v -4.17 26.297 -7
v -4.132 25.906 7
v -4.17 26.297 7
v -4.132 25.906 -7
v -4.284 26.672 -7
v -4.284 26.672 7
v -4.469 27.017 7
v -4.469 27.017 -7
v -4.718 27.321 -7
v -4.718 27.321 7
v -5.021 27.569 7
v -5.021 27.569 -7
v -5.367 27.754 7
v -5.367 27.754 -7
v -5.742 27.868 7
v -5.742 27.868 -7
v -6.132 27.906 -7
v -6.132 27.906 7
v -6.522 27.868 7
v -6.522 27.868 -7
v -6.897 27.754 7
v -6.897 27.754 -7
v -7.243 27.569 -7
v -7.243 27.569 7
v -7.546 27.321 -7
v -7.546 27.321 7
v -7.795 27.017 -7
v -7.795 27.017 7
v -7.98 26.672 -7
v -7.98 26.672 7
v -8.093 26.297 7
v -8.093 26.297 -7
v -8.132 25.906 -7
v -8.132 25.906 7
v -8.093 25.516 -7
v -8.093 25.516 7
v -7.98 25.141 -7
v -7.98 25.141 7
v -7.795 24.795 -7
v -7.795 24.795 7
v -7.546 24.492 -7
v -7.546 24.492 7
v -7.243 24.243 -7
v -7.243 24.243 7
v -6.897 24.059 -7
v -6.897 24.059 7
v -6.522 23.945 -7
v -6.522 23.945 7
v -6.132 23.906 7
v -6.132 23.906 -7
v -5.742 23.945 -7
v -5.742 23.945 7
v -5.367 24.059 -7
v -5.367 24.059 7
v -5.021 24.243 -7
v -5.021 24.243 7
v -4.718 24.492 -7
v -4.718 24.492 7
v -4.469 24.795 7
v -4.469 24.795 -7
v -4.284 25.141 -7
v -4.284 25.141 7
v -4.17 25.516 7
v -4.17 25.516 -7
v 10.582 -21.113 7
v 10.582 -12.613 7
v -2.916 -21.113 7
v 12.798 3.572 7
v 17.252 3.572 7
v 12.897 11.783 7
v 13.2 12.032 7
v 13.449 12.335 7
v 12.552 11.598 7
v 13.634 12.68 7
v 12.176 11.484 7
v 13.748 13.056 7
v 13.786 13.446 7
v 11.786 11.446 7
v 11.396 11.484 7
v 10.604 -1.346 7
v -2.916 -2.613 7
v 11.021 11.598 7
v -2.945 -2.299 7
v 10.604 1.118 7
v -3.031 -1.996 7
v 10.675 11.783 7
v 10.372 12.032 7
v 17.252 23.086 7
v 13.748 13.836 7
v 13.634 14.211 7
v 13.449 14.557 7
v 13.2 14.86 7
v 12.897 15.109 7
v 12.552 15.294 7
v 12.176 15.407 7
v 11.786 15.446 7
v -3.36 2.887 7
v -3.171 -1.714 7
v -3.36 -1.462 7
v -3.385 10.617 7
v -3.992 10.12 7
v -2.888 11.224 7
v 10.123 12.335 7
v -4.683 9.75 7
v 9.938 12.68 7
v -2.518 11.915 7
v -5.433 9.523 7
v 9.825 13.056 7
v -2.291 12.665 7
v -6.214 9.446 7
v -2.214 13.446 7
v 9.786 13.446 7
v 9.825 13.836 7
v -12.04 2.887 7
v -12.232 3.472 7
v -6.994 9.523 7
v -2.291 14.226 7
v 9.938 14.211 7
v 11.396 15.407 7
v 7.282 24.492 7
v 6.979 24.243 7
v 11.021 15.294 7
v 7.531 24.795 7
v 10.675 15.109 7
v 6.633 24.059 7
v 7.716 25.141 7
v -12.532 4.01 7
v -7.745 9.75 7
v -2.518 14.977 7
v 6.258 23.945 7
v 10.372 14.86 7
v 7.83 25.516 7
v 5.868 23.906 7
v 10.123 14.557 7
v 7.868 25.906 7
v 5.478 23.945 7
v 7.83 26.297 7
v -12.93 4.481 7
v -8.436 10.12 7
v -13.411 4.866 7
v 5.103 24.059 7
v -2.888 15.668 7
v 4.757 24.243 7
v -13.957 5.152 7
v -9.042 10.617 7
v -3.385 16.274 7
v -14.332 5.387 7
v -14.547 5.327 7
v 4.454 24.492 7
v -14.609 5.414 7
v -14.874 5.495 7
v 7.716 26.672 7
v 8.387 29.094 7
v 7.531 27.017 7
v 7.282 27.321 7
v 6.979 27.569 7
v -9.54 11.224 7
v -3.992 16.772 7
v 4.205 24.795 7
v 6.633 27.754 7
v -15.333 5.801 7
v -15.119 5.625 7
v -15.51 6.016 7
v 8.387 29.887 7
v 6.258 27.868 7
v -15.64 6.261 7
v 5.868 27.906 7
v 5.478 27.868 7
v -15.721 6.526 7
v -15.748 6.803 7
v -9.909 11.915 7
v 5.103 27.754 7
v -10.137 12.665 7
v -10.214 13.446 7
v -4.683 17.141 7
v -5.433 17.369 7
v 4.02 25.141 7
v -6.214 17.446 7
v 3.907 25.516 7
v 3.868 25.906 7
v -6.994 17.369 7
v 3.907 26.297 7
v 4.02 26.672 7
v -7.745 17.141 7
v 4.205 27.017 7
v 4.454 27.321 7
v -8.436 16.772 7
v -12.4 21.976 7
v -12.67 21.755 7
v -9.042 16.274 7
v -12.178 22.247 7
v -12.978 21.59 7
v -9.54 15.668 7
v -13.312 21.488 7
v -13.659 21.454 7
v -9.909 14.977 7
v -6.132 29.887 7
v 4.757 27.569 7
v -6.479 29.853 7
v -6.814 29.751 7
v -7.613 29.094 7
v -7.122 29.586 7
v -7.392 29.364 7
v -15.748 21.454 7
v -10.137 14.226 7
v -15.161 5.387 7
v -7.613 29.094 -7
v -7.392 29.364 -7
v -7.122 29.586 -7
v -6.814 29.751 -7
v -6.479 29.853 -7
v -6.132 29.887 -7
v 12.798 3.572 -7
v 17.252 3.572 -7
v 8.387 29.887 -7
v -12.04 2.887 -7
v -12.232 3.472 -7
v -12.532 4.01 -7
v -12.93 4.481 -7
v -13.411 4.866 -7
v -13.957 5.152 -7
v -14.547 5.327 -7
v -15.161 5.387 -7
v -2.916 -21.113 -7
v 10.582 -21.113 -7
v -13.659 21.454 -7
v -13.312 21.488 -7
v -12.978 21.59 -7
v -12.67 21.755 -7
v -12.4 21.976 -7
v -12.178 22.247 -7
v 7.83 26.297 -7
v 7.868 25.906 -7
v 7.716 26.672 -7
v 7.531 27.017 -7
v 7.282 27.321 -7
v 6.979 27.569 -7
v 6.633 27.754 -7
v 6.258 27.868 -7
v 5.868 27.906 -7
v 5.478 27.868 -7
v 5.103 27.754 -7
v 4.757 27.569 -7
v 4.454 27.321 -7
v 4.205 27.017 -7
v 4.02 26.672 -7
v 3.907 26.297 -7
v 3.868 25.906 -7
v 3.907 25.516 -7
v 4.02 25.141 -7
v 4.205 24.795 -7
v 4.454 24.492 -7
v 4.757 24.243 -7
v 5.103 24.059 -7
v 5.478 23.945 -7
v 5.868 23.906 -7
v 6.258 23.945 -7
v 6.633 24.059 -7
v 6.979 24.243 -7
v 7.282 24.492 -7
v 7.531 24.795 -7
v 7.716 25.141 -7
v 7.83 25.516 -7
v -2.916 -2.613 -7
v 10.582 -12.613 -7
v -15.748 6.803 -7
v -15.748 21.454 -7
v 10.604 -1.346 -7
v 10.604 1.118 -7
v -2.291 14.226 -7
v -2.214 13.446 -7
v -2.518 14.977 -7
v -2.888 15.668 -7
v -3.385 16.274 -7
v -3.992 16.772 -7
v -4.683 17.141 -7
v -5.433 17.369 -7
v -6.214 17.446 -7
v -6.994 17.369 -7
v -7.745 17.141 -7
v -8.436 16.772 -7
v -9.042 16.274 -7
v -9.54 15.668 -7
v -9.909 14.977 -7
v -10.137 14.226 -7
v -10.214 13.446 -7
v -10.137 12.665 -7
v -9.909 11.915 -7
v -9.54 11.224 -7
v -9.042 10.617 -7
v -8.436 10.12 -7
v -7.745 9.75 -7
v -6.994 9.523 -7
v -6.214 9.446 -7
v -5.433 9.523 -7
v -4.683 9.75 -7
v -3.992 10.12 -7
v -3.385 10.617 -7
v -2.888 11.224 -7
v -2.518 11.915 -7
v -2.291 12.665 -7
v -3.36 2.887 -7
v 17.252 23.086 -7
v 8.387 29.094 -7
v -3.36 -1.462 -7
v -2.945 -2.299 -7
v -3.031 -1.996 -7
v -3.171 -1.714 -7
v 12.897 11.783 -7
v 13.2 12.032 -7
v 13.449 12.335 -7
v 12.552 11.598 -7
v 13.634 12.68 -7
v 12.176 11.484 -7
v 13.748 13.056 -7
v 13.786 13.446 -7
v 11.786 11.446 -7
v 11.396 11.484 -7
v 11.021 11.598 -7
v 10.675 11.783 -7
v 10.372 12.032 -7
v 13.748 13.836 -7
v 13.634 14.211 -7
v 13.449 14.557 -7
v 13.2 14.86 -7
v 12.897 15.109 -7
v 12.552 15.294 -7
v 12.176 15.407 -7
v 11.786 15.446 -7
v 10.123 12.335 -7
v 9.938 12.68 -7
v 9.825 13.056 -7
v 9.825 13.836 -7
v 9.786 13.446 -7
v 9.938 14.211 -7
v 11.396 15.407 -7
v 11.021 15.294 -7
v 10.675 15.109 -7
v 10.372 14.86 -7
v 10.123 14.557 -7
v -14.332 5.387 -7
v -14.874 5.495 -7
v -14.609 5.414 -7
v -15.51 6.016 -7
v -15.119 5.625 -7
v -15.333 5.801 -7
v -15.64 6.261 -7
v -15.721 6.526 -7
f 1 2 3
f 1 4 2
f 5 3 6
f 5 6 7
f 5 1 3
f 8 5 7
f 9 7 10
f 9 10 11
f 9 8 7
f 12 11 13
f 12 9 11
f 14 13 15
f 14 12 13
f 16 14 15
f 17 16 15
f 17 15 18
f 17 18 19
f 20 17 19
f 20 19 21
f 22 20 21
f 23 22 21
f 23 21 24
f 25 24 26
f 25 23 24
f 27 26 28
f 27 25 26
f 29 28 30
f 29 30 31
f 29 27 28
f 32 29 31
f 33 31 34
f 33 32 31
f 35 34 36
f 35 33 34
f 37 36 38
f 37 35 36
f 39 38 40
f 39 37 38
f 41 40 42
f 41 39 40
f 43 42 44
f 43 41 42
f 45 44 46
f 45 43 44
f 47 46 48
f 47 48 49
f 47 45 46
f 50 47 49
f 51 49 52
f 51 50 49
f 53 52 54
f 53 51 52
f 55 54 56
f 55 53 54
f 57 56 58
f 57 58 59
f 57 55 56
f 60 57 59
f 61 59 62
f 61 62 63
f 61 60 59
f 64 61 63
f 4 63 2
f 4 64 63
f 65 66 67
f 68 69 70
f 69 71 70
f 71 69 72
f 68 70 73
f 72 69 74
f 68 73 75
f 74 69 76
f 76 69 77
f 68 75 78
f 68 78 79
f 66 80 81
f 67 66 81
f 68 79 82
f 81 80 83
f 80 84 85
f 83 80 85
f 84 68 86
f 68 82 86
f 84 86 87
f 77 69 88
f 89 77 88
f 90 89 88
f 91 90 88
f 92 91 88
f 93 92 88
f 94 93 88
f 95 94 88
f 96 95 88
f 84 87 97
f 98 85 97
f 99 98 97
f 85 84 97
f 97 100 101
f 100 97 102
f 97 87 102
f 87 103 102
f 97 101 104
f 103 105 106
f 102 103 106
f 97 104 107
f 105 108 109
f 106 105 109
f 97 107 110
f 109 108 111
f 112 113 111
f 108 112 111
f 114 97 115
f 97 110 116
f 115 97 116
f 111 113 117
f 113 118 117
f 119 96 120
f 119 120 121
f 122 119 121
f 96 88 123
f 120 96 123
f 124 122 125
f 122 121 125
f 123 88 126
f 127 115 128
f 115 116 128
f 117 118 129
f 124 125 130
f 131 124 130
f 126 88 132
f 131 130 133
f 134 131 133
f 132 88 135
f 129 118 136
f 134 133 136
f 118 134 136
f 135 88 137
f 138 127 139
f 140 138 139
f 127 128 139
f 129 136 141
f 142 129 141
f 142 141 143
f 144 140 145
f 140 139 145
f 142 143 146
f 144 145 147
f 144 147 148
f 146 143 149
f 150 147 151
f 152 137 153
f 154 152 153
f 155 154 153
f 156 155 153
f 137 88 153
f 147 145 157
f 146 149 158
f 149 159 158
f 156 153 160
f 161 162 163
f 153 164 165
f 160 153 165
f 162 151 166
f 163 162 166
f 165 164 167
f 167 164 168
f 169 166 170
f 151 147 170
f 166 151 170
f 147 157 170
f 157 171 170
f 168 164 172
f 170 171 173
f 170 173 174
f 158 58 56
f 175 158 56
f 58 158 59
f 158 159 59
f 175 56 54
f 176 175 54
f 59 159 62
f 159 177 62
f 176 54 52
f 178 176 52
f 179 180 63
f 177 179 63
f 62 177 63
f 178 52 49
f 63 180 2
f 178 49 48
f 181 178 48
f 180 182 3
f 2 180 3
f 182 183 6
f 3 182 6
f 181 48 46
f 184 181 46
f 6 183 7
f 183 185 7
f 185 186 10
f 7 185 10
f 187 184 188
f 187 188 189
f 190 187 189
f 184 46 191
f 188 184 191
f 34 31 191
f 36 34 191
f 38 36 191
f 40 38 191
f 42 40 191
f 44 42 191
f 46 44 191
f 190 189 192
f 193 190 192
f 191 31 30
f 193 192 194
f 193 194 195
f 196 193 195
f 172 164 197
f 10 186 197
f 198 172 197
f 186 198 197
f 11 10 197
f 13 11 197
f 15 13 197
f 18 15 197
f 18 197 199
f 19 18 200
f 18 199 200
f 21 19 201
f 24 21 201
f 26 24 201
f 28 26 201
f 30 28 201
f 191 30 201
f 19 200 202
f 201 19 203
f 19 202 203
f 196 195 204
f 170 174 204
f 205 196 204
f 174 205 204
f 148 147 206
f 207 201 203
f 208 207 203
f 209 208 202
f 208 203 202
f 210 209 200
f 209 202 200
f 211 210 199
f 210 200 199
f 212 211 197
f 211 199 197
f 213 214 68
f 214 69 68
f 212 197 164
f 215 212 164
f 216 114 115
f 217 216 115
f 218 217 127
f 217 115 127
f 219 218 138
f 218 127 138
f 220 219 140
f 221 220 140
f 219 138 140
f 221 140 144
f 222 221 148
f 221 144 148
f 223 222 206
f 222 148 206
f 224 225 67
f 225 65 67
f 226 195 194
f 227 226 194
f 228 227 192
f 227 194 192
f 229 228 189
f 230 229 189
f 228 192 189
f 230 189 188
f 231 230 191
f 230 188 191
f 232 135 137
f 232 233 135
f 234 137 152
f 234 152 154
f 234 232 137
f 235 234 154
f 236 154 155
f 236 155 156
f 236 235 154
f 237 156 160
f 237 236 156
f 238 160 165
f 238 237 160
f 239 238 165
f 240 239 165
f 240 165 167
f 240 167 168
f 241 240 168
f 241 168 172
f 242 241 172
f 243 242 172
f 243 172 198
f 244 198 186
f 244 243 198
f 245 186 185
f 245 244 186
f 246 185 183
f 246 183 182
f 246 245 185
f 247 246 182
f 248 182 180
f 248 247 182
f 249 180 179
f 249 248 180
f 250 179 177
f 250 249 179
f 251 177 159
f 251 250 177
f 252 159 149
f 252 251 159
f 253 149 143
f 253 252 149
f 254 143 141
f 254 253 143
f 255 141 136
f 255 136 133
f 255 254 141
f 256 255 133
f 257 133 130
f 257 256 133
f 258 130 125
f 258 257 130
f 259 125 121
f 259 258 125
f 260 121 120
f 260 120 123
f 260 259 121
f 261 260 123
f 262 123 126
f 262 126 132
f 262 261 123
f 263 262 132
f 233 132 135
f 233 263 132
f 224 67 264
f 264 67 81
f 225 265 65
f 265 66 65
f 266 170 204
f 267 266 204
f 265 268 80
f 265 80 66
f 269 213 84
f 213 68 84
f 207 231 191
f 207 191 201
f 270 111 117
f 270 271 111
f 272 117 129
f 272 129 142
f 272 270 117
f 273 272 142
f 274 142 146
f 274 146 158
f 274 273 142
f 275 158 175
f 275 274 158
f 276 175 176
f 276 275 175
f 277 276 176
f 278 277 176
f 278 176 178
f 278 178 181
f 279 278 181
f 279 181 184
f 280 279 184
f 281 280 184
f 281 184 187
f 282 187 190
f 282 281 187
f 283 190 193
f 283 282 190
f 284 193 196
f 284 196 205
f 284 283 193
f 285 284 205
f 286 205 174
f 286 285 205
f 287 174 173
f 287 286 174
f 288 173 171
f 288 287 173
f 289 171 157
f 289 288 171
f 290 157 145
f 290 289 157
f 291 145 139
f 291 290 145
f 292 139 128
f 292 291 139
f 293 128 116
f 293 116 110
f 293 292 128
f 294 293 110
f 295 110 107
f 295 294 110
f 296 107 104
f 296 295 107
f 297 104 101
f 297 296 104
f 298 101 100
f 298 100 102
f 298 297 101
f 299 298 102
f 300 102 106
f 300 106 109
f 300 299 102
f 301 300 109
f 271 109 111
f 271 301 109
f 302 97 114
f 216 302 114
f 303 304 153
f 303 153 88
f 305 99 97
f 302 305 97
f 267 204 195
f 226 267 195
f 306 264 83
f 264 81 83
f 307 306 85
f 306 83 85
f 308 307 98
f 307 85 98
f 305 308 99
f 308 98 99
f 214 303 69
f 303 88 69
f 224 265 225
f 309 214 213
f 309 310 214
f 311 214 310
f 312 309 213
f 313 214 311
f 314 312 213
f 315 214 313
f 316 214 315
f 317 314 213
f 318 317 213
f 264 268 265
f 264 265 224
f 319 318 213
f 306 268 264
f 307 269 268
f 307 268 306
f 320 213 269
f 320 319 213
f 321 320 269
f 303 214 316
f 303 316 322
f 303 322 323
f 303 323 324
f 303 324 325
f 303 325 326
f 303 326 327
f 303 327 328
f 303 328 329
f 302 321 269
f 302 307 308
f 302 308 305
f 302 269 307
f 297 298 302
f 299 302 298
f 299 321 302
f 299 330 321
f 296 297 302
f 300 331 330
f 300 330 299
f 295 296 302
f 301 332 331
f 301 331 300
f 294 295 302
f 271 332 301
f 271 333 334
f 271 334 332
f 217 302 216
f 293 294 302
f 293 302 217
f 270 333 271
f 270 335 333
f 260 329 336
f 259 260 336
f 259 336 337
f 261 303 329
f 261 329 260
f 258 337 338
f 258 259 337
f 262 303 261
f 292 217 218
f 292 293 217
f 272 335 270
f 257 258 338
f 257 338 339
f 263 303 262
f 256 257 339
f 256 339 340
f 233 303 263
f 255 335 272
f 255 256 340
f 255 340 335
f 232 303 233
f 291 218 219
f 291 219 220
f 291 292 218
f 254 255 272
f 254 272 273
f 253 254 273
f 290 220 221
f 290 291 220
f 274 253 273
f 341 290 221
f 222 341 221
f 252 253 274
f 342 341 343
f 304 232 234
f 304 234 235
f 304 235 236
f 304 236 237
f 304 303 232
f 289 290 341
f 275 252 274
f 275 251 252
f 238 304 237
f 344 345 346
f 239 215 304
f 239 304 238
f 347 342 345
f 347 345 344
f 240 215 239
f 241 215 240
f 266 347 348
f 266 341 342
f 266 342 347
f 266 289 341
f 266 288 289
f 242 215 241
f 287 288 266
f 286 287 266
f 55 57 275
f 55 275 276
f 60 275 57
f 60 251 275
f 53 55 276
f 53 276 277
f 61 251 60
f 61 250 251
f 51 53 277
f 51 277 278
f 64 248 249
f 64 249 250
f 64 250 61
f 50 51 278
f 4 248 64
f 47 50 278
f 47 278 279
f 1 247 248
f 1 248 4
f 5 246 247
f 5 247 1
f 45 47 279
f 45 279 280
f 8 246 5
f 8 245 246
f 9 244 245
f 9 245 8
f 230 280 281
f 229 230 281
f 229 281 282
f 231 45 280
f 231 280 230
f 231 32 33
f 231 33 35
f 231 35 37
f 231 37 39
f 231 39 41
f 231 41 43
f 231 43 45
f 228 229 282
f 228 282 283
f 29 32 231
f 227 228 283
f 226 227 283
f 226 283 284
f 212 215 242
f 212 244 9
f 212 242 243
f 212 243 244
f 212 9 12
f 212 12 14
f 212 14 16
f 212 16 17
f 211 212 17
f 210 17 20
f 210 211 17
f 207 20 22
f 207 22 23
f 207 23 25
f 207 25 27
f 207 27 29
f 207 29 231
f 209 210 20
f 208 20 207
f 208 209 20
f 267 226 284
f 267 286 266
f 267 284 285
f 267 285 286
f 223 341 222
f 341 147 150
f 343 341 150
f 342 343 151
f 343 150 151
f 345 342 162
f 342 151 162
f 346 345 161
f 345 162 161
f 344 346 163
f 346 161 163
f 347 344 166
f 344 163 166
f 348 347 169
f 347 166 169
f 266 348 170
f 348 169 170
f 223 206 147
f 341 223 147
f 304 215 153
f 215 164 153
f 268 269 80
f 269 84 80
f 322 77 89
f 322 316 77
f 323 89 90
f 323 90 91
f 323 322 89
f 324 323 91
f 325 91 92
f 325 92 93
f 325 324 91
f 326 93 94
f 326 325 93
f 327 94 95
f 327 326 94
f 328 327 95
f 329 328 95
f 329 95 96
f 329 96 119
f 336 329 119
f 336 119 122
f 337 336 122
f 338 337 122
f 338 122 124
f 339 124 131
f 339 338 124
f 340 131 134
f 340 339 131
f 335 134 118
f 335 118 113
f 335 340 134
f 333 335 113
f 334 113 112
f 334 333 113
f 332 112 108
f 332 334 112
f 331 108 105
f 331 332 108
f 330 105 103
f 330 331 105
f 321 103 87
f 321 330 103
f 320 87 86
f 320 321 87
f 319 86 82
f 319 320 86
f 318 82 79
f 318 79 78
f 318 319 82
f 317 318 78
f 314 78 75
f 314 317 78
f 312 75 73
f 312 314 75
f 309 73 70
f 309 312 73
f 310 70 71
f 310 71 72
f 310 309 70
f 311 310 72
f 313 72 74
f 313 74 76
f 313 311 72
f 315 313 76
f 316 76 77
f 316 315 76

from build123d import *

# Parameters (mm, degrees)
SKETCH2_R           = 4
SKETCH2_R_2         = 2
BOSS_EXTRUDE1_DEPTH = 7


with BuildPart() as part:
    # Sketch2 → Boss-Extrude1 (new body, symmetric)
    with BuildSketch(Plane.XY):
        with BuildLine():
            Line((-6.131872753, 29.88679476), (5.868127247, 29.88679476))
            Line((5.868127247, 29.88679476), (7.594498309, 29.88679476))
            Line((7.594498309, 29.88679476), (8.387086053, 29.88679476))
            Line((8.387086053, 29.88679476), (8.387086053, 29.094207016))
            Line((8.387086053, 29.094207016), (17.251890726, 23.08634601))
            Line((17.251890726, 23.08634601), (17.251890726, 20.138485624))
            Line((17.251890726, 20.138485624), (17.251890726, 4.758566897))
            Line((17.251890726, 4.758566897), (17.251890726, 3.572124473))
            Line((17.251890726, 3.572124473), (12.798407994, 3.572124473))
            Line((12.798407994, 3.572124473), (10.603625269, 1.11753322))
            Line((10.603625269, 1.11753322), (10.603625269, -1.34605728))
            Line((10.603625269, -1.34605728), (10.581729624, -12.61320524))
            Line((10.581729624, -12.61320524), (10.581729624, -21.11320524))
            Line((10.581729624, -21.11320524), (-2.916105285, -21.11320524))
            Line((-2.916105285, -21.11320524), (-2.916105285, -12.61320524))
            Line((-2.916105285, -12.61320524), (-2.916105285, -2.61320524))
            ThreePointArc((-2.916105285, -2.61320524), (-3.030865934, -1.996216384), (-3.359797705, -1.461754837))
            Line((-3.359797705, -1.461754837), (-3.359797705, 2.88679476))
            Line((-3.359797705, 2.88679476), (-12.040045413, 2.88679476))
            ThreePointArc((-12.040045413, 2.88679476), (-13.161439875, 4.684724171), (-15.160732898, 5.38679476))
            Line((-15.160732898, 5.38679476), (-14.332399999, 5.38679476))
            ThreePointArc((-14.332399999, 5.38679476), (-15.333457628, 5.801446406), (-15.748109274, 6.802504035))
            Line((-15.748109274, 6.802504035), (-15.748109274, 20.089109399))
            Line((-15.748109274, 20.089109399), (-15.748109274, 21.453992916))
            Line((-15.748109274, 21.453992916), (-13.659474375, 21.453992916))
            ThreePointArc((-13.659474375, 21.453992916), (-12.819577694, 21.664599805), (-12.178425993, 22.246584507))
            Line((-12.178425993, 22.246584507), (-7.612913947, 29.094207016))
            ThreePointArc((-7.612913947, 29.094207016), (-6.971765358, 29.676188893), (-6.131872753, 29.88679476))
        make_face()
        with Locations((-6.213784577, 13.445806717)):
            Circle(SKETCH2_R, mode=Mode.SUBTRACT)
        with Locations((11.786215423, 13.445806717)):
            Circle(SKETCH2_R_2, mode=Mode.SUBTRACT)
        with Locations((-6.131872753, 25.90633221)):
            Circle(SKETCH2_R_2, mode=Mode.SUBTRACT)
        with Locations((5.868127247, 25.90633221)):
            Circle(SKETCH2_R_2, mode=Mode.SUBTRACT)
    extrude(amount=BOSS_EXTRUDE1_DEPTH, both=True)


solid = part.part
